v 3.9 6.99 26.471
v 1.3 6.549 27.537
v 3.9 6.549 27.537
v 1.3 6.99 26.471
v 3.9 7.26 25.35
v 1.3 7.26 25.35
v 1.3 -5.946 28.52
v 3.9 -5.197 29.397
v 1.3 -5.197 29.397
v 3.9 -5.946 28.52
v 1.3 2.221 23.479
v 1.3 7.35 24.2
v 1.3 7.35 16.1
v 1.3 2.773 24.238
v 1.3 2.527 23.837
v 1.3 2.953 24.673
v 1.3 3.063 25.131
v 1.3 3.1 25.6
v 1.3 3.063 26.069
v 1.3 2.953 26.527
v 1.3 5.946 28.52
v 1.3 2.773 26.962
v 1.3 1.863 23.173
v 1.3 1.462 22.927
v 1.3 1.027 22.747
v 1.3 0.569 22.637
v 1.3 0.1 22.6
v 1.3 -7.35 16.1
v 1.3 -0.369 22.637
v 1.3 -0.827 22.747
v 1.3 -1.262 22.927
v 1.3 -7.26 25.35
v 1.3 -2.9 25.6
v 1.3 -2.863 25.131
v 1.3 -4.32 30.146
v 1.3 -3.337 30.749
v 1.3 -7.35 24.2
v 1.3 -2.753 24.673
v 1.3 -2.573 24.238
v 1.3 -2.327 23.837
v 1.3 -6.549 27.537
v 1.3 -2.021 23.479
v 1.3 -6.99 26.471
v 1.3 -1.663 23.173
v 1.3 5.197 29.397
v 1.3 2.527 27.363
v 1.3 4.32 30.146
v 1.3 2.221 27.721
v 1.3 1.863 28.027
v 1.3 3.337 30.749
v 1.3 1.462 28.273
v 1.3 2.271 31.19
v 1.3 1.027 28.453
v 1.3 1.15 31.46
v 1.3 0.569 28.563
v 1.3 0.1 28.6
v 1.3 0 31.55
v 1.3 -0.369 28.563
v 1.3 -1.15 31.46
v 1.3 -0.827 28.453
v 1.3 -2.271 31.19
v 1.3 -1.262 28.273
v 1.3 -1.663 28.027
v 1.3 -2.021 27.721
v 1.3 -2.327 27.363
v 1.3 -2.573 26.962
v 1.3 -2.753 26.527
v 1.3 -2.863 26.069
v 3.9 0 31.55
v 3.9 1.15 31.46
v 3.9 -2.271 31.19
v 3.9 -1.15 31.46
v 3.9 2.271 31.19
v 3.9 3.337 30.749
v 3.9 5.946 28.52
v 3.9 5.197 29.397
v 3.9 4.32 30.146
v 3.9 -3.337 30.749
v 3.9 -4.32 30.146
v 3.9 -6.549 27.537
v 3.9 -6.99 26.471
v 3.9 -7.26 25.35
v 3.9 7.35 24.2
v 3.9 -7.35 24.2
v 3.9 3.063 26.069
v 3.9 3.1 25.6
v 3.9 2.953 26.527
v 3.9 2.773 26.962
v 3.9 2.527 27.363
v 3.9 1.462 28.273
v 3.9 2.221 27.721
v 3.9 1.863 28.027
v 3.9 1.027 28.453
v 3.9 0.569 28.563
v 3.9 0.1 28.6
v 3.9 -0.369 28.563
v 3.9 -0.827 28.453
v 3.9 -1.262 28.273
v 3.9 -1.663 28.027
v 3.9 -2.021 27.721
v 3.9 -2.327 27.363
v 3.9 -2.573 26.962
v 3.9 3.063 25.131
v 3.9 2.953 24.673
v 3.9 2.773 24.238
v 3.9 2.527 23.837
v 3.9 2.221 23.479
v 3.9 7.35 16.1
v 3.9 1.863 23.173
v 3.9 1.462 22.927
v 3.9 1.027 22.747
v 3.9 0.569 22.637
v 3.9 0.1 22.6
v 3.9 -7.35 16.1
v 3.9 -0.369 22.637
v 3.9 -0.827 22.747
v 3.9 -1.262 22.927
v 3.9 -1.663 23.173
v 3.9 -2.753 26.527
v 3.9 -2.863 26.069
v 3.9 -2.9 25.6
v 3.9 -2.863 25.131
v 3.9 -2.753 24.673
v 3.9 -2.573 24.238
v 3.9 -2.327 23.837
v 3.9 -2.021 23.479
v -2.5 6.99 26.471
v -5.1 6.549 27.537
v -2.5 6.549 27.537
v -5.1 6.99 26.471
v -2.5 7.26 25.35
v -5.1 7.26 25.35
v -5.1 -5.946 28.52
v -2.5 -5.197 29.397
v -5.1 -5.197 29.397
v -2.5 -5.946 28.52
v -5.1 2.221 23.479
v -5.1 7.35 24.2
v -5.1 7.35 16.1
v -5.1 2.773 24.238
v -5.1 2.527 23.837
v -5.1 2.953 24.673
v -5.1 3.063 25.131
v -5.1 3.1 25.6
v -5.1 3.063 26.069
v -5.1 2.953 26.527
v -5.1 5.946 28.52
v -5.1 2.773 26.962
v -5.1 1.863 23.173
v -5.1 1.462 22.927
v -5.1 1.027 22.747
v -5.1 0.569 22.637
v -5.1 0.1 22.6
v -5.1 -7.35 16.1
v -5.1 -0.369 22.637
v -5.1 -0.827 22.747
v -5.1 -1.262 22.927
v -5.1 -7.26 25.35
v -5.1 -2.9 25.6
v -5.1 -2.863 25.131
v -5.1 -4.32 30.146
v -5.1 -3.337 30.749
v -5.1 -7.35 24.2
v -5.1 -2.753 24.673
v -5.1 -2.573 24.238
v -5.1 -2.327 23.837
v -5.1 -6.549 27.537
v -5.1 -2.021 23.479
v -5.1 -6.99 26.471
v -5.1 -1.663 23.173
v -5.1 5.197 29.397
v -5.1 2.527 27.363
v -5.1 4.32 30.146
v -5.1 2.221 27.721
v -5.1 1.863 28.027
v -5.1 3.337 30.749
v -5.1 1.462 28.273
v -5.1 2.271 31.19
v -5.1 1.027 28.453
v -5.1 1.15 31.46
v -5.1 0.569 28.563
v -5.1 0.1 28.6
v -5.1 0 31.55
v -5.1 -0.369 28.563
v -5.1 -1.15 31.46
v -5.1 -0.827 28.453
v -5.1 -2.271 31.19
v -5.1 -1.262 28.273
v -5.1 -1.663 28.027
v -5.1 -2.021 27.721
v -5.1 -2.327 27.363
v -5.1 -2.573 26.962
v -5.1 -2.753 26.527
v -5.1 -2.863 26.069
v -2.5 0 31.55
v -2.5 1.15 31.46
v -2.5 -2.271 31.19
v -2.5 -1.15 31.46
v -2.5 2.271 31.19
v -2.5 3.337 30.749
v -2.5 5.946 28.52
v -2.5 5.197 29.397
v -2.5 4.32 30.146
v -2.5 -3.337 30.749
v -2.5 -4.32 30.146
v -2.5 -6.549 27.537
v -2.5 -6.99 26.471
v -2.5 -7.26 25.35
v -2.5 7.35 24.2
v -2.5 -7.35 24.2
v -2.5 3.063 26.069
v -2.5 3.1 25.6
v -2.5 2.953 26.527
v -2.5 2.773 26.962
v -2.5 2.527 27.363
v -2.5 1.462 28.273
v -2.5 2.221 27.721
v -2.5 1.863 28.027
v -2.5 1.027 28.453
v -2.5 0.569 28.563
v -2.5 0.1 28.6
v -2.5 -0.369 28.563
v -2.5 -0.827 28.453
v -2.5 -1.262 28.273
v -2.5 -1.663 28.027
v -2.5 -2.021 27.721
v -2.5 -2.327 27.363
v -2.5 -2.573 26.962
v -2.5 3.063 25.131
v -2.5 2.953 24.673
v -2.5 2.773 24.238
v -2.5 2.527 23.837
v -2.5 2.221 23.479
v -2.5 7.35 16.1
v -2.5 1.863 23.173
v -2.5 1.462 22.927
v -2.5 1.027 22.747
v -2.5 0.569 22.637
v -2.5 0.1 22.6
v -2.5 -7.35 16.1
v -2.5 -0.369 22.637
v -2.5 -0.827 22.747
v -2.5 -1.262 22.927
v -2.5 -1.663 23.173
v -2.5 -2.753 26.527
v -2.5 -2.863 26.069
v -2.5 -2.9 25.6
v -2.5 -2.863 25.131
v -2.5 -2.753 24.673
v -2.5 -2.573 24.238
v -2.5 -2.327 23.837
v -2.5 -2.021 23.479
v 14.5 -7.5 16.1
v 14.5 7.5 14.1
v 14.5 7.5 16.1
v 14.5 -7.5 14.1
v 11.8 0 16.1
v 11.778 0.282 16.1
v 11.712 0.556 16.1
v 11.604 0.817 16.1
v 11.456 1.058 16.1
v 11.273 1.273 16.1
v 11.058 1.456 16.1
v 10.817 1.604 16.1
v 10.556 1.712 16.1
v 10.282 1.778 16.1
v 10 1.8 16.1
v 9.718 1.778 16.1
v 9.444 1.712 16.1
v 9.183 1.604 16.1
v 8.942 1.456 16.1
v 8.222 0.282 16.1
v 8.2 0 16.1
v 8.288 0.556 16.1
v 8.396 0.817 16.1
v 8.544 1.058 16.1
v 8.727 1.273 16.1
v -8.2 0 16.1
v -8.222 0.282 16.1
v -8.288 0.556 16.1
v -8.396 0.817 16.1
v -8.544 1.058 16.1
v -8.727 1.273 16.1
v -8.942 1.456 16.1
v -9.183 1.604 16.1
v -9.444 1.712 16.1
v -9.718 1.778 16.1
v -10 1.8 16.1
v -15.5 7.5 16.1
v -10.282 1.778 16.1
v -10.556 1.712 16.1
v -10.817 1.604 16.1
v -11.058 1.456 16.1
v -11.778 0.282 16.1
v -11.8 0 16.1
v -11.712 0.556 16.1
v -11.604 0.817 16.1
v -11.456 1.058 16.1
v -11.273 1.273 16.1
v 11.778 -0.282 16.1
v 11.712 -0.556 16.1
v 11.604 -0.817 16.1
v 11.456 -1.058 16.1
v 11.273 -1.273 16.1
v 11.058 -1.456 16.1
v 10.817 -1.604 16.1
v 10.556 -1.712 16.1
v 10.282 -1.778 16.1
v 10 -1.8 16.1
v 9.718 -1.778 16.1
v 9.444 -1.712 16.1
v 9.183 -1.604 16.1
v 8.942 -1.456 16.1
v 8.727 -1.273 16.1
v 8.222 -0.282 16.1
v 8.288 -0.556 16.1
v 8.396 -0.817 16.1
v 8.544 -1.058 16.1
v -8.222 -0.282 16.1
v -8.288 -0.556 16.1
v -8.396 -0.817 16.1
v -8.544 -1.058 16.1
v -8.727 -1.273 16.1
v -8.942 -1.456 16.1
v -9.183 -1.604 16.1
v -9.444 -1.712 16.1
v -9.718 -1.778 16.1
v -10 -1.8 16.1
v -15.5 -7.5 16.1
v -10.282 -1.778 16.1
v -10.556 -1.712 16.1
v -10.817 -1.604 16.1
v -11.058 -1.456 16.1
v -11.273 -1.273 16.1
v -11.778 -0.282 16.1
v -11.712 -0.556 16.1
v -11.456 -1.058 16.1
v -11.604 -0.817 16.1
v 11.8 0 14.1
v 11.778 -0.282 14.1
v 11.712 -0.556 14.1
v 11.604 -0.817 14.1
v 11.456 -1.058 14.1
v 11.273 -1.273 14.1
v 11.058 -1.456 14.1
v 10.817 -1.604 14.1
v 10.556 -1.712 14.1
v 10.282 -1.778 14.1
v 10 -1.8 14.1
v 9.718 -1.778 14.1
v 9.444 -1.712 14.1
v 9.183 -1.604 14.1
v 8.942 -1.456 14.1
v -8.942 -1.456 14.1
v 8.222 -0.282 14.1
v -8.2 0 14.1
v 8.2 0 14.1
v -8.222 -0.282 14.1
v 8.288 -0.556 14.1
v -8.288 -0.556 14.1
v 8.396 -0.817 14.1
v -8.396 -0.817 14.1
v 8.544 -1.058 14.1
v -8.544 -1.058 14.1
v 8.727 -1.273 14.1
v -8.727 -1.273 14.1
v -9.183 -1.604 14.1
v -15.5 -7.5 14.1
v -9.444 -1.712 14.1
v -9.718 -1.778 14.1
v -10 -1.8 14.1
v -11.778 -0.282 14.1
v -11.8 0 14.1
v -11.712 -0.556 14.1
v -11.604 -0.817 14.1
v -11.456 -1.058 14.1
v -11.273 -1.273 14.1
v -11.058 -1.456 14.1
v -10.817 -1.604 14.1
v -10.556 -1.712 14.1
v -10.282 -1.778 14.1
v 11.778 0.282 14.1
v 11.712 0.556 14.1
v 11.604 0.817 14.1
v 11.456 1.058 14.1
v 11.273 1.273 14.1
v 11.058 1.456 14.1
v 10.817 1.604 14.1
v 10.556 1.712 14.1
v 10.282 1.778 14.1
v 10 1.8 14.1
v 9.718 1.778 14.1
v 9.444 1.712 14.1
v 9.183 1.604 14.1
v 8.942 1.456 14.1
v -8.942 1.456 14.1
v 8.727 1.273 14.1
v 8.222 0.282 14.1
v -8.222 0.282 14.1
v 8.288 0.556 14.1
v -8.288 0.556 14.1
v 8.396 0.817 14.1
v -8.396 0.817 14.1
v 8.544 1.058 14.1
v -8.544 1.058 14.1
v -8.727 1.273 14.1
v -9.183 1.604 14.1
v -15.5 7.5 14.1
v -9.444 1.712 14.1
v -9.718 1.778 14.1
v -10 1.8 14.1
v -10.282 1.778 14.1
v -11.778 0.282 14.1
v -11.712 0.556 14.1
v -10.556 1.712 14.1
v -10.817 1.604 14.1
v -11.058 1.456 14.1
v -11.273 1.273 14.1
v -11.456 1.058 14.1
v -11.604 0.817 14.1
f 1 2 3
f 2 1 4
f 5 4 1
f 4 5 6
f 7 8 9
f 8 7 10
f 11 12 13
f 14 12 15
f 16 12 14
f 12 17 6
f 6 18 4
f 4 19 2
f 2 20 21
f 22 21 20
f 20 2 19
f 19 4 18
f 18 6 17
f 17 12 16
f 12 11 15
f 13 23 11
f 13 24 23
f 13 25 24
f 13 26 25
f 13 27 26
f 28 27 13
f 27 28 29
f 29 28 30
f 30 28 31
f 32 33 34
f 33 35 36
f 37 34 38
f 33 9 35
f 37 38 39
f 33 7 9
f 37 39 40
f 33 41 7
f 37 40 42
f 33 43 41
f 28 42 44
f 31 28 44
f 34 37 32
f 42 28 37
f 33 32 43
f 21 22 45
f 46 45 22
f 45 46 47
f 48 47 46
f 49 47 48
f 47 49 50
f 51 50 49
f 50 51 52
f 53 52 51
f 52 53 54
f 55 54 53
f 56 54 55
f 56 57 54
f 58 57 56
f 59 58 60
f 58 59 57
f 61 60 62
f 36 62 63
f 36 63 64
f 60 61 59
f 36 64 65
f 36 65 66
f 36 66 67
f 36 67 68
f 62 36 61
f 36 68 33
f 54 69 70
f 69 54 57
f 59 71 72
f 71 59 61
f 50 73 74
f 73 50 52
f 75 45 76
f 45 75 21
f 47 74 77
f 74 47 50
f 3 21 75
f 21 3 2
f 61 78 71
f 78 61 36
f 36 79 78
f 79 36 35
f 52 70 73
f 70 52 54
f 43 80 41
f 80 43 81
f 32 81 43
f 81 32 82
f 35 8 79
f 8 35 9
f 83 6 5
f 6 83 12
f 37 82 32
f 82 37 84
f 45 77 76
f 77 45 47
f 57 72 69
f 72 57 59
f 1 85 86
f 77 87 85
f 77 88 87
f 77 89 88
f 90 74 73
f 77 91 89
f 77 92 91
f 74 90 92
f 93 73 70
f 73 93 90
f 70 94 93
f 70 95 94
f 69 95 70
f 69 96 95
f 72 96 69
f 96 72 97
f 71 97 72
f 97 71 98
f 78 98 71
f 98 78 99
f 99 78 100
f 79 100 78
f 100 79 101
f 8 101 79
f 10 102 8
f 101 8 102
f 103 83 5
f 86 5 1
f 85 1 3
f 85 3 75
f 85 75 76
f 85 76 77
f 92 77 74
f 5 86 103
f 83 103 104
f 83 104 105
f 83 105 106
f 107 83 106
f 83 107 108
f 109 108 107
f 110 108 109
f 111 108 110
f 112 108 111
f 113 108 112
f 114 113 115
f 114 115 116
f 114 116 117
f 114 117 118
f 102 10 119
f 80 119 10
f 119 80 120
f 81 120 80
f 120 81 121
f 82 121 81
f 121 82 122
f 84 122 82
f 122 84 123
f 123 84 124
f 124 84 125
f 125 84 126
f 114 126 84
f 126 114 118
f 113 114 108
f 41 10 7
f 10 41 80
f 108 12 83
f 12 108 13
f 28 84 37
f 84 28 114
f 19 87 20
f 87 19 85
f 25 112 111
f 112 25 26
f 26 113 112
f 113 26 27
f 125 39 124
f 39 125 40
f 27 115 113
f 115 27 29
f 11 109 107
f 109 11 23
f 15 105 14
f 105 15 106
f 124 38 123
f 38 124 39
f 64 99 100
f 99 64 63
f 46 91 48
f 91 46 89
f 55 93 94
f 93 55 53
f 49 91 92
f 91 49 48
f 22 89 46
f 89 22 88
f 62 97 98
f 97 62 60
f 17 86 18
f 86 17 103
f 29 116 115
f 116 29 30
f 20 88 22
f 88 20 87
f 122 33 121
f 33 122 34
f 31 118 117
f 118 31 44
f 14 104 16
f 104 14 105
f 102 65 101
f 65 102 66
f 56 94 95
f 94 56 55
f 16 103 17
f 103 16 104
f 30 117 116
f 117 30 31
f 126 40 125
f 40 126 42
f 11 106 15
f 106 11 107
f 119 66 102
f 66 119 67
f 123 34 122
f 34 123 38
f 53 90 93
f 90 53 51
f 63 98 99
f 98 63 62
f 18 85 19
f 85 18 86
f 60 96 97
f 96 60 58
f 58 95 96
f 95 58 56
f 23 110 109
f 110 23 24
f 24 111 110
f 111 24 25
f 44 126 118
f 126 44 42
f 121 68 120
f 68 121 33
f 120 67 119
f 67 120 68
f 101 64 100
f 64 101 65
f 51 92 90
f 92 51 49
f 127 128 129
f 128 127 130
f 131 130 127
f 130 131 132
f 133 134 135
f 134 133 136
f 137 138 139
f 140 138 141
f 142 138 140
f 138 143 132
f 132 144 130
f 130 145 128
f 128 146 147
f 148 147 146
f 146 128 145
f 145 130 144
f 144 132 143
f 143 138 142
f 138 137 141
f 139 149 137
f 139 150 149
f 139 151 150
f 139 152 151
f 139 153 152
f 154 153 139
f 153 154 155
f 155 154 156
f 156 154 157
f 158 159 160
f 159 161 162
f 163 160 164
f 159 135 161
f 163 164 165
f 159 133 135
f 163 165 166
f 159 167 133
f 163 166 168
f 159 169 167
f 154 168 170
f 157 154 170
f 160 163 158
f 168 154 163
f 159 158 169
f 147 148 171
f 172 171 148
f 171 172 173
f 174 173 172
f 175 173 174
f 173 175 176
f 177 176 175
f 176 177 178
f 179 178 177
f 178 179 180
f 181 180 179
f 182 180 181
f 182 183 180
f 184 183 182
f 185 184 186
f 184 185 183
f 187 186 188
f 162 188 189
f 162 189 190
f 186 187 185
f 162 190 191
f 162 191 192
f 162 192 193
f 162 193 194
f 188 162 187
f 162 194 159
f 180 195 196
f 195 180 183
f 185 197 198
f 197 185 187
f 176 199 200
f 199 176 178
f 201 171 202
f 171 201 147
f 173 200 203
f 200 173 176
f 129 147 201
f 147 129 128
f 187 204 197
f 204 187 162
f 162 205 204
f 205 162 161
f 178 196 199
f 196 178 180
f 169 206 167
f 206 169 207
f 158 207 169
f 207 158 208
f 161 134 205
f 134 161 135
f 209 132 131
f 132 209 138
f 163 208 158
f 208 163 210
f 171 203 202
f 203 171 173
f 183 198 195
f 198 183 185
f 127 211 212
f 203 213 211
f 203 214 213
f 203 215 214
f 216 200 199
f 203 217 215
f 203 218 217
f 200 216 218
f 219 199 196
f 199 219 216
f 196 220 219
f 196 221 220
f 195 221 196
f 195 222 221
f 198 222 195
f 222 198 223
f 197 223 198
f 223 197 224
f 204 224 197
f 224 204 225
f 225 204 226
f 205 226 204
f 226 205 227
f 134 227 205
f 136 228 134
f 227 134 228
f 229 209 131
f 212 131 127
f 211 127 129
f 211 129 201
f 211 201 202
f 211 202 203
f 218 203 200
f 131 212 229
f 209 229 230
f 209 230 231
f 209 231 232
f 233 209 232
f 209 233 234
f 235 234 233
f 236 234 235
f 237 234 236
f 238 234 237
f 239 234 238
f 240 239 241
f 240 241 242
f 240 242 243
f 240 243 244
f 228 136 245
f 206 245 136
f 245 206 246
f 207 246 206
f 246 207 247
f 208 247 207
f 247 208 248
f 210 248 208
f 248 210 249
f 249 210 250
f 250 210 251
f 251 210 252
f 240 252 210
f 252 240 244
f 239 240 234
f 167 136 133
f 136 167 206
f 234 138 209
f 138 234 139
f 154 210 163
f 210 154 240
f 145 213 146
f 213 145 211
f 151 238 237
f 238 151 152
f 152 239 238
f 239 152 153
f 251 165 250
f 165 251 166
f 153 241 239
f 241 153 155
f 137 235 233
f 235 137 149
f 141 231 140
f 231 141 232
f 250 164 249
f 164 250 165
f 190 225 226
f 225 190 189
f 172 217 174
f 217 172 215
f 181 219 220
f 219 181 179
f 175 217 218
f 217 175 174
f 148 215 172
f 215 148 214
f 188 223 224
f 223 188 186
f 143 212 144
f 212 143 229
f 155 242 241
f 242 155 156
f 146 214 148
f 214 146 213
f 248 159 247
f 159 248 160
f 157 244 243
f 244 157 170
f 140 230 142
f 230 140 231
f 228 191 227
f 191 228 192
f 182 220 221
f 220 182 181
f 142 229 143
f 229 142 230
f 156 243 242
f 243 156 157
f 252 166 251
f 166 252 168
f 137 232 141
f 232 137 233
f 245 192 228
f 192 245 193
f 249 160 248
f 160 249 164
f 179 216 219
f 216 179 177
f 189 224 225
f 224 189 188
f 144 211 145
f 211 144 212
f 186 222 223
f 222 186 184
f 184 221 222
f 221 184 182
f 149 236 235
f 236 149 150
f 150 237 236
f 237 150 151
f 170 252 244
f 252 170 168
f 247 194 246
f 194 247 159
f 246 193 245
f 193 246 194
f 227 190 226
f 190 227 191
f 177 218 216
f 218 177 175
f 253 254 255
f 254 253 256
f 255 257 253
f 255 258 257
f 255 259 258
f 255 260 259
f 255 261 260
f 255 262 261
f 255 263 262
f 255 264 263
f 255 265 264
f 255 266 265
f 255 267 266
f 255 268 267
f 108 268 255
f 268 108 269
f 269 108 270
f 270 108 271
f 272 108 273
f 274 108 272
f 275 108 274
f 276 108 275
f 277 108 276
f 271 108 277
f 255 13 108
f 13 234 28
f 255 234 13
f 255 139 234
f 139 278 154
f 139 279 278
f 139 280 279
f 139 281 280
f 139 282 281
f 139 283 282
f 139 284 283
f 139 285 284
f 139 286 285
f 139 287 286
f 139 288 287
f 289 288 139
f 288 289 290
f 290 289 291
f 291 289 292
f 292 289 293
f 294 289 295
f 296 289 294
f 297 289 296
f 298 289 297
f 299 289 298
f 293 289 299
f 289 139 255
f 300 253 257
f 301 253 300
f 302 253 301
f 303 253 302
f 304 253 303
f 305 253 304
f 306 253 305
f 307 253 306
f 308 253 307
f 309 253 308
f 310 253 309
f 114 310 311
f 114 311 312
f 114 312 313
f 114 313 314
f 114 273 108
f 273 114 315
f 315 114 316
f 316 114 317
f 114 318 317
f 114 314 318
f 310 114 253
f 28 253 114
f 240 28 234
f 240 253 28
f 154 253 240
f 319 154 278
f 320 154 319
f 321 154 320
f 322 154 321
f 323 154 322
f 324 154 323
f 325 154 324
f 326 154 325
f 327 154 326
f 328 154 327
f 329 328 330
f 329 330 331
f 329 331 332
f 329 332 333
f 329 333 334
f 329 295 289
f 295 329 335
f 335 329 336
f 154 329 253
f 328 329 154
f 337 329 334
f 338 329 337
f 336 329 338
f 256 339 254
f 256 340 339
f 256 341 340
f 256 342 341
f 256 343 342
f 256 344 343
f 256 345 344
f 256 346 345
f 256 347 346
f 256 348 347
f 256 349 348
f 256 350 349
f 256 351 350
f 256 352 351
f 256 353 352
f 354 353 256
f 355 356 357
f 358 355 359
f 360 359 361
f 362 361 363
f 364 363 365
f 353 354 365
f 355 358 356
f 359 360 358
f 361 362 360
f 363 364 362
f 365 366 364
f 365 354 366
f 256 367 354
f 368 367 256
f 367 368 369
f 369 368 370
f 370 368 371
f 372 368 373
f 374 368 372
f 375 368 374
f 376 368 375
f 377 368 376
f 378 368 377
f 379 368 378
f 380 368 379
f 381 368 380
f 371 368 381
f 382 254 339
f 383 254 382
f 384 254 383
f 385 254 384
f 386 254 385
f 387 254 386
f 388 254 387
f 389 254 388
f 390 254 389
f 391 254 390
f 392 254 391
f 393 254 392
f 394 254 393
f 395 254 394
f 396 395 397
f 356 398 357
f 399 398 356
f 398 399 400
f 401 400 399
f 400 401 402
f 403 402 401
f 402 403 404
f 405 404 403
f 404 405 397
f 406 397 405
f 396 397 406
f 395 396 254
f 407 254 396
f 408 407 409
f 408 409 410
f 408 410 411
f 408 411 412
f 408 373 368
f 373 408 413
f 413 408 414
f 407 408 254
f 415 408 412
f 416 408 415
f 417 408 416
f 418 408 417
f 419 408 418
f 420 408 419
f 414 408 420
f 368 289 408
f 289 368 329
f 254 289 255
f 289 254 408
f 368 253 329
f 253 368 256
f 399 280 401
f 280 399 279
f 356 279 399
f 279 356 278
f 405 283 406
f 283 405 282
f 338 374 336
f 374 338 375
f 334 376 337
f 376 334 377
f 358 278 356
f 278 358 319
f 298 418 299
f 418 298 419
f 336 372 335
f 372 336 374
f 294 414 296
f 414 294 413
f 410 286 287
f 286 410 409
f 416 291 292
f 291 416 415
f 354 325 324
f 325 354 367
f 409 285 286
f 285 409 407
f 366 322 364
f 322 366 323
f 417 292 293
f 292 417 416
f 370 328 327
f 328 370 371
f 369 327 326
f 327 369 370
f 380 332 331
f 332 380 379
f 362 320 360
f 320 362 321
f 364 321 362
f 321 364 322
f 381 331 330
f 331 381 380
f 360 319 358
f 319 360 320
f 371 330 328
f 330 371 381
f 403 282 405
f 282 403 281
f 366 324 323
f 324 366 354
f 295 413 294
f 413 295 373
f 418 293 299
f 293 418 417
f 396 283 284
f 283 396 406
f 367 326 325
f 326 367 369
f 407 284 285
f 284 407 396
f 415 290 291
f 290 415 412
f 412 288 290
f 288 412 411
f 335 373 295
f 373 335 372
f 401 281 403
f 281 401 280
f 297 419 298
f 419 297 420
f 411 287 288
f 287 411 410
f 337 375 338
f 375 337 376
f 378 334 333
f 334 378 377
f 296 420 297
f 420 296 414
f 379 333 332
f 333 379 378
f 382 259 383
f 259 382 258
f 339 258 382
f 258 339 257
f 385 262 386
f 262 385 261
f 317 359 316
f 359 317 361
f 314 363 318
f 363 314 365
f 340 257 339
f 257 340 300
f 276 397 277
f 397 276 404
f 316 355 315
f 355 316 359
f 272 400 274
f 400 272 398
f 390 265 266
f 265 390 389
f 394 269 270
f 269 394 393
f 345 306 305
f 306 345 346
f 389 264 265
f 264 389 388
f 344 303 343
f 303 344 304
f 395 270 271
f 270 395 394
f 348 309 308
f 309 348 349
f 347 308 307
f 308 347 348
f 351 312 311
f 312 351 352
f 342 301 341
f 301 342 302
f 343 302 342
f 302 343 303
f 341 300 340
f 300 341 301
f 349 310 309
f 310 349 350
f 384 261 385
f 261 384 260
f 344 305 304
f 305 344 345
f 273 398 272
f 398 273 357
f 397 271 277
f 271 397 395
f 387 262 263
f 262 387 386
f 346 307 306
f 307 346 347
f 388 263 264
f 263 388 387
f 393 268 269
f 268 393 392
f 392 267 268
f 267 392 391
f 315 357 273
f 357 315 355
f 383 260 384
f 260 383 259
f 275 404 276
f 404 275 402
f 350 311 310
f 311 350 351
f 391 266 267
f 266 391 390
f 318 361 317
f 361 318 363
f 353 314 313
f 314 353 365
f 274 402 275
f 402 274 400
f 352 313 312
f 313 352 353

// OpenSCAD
// file: ../lib/gopro_like_connector.scad
$fn = 40;

module connector(wall=2, sz_x=19, sz_y=15) {
  translate([7+(19-sz_x)/2, 5.5+(15-sz_y)/2, 7.5]) {
    cube([sz_x, sz_y, wall]);
  }
  translate([26.5, 5.4, 7.4]) {
    rotate([0, 90, 90]) {
      for(y=[0, 6.4]) {
        translate([-10.2, 6.9+y, 7.6]) {
          rotate([90, 0, 0]) {
            difference() {
              union() {
                cylinder(d=14.7, h=2.6, center=true);
                translate([5, 0, 0]) {
                  cube([10, 14.7, 2.6], center=true);
                }
              }
              translate([-1.4, 0.1, 0]) {
                cylinder(d=6, h=3, center=true);
              }
            }
          }
        }
      }
    }
  }
}


difference() {
    connector(sz_y=36, sz_x =9);
    translate([17, 13, 7]) {
        for(y=[-1,1]) {
            translate([0, y*12, 0]) {
                cylinder(d=3.6, h=10, center=true);
            }
        }
    }
}
// main file
use <../lib/gopro_like_connector.scad>

$fn = 40;

wall = 2;

ttf_hole_sz_x = 26;
ttf_hole_sz_y = 26;
ttf_hole_shift_x = 3.8;

ttf_stand_d = 4;
ttf_stand_h = 3;
ttf_stand_hole_d = 1.8;

ttf_pcb_sz_x = 39.8;
ttf_pcb_sz_y = 28.8;
ttf_pcb_sz_z = 1.6;

border_sz_z = ttf_pcb_sz_z+ttf_stand_h;

stand_dist_x = 34.2;
stand_dist_y = 23.2;

hole_d = 2.9;
hole_d_through = 3.6;

ear_hole_d = hole_d_through;
ear_sz_x = ear_hole_d + 2 * wall;
ear_sz_y = 2;
ear_sz_z = wall+border_sz_z+5;

pins_hole_sz_x = 5;
pins_hole_sz_y = 19;


border_butt_sz_z = ear_sz_z-wall-border_sz_z;

module ears(hole_mode=false) {
  // ears
  translate([0, 0, ear_sz_z/2]) {
    for(y=[-1,1]) {
      translate([0, y*(ttf_pcb_sz_y+ear_sz_y+2*wall)/2, 0]) {
        if(!hole_mode) {
          translate([0, 0, -ear_sz_x/4]) {
            cube([ear_sz_x, ear_sz_y, ear_sz_z+wall-ear_sz_x/2], center=true);
          }
        }
        translate([0, 0, (ear_sz_z-ear_sz_x+wall)/2]) {
          rotate([90, 0, 0]) {
            cylinder(d=hole_mode ? ear_hole_d : ear_sz_x, h=ear_sz_y+(hole_mode ? 1 : 0), center=true);
          }
        }
      }
    }
  }
}

module ttf_face_part() {
  difference() {
    union() {
      difference() {
        translate([0, 0, border_sz_z/2]) {
          cube([ttf_pcb_sz_x+2*wall, ttf_pcb_sz_y+2*wall, wall+border_sz_z], true);
        }
        translate([0, 0, (border_sz_z)/2+wall]) {
          cube([ttf_pcb_sz_x, ttf_pcb_sz_y, wall+border_sz_z], true);
        }
      }
      for(x=[-1,1]) {
        for(y=[-1,1]) {
          translate([x*stand_dist_x/2, y*stand_dist_y/2, (wall+ttf_stand_h)/2]) {
            cylinder(d=ttf_stand_d, h=ttf_stand_h, center=true);
          }
        }
      }
      ears();
    }
    // ttf hole
    translate([ttf_hole_shift_x/2, 0, 0]) {
      cube([ttf_hole_sz_x, ttf_hole_sz_y, wall*2], center=true);
    }
    // stand holes
    for(x=[-1,1]) {
      for(y=[-1,1]) {
        translate([x*stand_dist_x/2, y*stand_dist_y/2, (1+ttf_stand_h)/2]) {
          cylinder(d=ttf_stand_hole_d, h=ttf_stand_h+wall-1, center=true);
        }
      }
    }
    // ear holes
    ears(hole_mode=true);
  }
}

module ttf_butt_part() {
  difference() {
    translate([0, 0, border_butt_sz_z/2]) {
      cube([ttf_pcb_sz_x+2*wall, ttf_pcb_sz_y+2*wall, wall+border_butt_sz_z], true);
    }
    translate([0, 0, (border_butt_sz_z-wall)/2]) {
      cube([ttf_pcb_sz_x, ttf_pcb_sz_y, wall+border_butt_sz_z], true);
    }
    // ears holes
    translate([0, 0, ear_sz_x/4]) {
      for(y=[-1,1]) {
        translate([0, y*(ttf_pcb_sz_y+2*wall)/2, 0]) {
            rotate([90, 0, 0]) {
              cylinder(d=hole_d, h=20, center=true);
            }
        }
      }
    }
    for(x=[-1,1]) {
      translate([x*20/2, 0, 0]) {
        cylinder(d=hole_d, h=20, center=true);
      }
    }
    // pins hole
    translate([(ttf_pcb_sz_x-pins_hole_sz_x)/2, 0, 0]) {
      cube([pins_hole_sz_x, pins_hole_sz_y, 20], center=true);
    }
  }
}

module pole_attachment() {
  difference() {
    translate([-17, -13, 0]) {
      connector(sz_x=30);
    }
    for(x=[-1,1]) {
      translate([x*20/2, 0, 0]) {
        cylinder(d=hole_d_through, h=20, center=true);
      }
    }
  }
}


translate([0, 0, border_sz_z+wall]) {
  pole_attachment();
}

//ttf_face_part();
translate([0, 0, border_sz_z+wall]) {
  //ttf_butt_part();
}
